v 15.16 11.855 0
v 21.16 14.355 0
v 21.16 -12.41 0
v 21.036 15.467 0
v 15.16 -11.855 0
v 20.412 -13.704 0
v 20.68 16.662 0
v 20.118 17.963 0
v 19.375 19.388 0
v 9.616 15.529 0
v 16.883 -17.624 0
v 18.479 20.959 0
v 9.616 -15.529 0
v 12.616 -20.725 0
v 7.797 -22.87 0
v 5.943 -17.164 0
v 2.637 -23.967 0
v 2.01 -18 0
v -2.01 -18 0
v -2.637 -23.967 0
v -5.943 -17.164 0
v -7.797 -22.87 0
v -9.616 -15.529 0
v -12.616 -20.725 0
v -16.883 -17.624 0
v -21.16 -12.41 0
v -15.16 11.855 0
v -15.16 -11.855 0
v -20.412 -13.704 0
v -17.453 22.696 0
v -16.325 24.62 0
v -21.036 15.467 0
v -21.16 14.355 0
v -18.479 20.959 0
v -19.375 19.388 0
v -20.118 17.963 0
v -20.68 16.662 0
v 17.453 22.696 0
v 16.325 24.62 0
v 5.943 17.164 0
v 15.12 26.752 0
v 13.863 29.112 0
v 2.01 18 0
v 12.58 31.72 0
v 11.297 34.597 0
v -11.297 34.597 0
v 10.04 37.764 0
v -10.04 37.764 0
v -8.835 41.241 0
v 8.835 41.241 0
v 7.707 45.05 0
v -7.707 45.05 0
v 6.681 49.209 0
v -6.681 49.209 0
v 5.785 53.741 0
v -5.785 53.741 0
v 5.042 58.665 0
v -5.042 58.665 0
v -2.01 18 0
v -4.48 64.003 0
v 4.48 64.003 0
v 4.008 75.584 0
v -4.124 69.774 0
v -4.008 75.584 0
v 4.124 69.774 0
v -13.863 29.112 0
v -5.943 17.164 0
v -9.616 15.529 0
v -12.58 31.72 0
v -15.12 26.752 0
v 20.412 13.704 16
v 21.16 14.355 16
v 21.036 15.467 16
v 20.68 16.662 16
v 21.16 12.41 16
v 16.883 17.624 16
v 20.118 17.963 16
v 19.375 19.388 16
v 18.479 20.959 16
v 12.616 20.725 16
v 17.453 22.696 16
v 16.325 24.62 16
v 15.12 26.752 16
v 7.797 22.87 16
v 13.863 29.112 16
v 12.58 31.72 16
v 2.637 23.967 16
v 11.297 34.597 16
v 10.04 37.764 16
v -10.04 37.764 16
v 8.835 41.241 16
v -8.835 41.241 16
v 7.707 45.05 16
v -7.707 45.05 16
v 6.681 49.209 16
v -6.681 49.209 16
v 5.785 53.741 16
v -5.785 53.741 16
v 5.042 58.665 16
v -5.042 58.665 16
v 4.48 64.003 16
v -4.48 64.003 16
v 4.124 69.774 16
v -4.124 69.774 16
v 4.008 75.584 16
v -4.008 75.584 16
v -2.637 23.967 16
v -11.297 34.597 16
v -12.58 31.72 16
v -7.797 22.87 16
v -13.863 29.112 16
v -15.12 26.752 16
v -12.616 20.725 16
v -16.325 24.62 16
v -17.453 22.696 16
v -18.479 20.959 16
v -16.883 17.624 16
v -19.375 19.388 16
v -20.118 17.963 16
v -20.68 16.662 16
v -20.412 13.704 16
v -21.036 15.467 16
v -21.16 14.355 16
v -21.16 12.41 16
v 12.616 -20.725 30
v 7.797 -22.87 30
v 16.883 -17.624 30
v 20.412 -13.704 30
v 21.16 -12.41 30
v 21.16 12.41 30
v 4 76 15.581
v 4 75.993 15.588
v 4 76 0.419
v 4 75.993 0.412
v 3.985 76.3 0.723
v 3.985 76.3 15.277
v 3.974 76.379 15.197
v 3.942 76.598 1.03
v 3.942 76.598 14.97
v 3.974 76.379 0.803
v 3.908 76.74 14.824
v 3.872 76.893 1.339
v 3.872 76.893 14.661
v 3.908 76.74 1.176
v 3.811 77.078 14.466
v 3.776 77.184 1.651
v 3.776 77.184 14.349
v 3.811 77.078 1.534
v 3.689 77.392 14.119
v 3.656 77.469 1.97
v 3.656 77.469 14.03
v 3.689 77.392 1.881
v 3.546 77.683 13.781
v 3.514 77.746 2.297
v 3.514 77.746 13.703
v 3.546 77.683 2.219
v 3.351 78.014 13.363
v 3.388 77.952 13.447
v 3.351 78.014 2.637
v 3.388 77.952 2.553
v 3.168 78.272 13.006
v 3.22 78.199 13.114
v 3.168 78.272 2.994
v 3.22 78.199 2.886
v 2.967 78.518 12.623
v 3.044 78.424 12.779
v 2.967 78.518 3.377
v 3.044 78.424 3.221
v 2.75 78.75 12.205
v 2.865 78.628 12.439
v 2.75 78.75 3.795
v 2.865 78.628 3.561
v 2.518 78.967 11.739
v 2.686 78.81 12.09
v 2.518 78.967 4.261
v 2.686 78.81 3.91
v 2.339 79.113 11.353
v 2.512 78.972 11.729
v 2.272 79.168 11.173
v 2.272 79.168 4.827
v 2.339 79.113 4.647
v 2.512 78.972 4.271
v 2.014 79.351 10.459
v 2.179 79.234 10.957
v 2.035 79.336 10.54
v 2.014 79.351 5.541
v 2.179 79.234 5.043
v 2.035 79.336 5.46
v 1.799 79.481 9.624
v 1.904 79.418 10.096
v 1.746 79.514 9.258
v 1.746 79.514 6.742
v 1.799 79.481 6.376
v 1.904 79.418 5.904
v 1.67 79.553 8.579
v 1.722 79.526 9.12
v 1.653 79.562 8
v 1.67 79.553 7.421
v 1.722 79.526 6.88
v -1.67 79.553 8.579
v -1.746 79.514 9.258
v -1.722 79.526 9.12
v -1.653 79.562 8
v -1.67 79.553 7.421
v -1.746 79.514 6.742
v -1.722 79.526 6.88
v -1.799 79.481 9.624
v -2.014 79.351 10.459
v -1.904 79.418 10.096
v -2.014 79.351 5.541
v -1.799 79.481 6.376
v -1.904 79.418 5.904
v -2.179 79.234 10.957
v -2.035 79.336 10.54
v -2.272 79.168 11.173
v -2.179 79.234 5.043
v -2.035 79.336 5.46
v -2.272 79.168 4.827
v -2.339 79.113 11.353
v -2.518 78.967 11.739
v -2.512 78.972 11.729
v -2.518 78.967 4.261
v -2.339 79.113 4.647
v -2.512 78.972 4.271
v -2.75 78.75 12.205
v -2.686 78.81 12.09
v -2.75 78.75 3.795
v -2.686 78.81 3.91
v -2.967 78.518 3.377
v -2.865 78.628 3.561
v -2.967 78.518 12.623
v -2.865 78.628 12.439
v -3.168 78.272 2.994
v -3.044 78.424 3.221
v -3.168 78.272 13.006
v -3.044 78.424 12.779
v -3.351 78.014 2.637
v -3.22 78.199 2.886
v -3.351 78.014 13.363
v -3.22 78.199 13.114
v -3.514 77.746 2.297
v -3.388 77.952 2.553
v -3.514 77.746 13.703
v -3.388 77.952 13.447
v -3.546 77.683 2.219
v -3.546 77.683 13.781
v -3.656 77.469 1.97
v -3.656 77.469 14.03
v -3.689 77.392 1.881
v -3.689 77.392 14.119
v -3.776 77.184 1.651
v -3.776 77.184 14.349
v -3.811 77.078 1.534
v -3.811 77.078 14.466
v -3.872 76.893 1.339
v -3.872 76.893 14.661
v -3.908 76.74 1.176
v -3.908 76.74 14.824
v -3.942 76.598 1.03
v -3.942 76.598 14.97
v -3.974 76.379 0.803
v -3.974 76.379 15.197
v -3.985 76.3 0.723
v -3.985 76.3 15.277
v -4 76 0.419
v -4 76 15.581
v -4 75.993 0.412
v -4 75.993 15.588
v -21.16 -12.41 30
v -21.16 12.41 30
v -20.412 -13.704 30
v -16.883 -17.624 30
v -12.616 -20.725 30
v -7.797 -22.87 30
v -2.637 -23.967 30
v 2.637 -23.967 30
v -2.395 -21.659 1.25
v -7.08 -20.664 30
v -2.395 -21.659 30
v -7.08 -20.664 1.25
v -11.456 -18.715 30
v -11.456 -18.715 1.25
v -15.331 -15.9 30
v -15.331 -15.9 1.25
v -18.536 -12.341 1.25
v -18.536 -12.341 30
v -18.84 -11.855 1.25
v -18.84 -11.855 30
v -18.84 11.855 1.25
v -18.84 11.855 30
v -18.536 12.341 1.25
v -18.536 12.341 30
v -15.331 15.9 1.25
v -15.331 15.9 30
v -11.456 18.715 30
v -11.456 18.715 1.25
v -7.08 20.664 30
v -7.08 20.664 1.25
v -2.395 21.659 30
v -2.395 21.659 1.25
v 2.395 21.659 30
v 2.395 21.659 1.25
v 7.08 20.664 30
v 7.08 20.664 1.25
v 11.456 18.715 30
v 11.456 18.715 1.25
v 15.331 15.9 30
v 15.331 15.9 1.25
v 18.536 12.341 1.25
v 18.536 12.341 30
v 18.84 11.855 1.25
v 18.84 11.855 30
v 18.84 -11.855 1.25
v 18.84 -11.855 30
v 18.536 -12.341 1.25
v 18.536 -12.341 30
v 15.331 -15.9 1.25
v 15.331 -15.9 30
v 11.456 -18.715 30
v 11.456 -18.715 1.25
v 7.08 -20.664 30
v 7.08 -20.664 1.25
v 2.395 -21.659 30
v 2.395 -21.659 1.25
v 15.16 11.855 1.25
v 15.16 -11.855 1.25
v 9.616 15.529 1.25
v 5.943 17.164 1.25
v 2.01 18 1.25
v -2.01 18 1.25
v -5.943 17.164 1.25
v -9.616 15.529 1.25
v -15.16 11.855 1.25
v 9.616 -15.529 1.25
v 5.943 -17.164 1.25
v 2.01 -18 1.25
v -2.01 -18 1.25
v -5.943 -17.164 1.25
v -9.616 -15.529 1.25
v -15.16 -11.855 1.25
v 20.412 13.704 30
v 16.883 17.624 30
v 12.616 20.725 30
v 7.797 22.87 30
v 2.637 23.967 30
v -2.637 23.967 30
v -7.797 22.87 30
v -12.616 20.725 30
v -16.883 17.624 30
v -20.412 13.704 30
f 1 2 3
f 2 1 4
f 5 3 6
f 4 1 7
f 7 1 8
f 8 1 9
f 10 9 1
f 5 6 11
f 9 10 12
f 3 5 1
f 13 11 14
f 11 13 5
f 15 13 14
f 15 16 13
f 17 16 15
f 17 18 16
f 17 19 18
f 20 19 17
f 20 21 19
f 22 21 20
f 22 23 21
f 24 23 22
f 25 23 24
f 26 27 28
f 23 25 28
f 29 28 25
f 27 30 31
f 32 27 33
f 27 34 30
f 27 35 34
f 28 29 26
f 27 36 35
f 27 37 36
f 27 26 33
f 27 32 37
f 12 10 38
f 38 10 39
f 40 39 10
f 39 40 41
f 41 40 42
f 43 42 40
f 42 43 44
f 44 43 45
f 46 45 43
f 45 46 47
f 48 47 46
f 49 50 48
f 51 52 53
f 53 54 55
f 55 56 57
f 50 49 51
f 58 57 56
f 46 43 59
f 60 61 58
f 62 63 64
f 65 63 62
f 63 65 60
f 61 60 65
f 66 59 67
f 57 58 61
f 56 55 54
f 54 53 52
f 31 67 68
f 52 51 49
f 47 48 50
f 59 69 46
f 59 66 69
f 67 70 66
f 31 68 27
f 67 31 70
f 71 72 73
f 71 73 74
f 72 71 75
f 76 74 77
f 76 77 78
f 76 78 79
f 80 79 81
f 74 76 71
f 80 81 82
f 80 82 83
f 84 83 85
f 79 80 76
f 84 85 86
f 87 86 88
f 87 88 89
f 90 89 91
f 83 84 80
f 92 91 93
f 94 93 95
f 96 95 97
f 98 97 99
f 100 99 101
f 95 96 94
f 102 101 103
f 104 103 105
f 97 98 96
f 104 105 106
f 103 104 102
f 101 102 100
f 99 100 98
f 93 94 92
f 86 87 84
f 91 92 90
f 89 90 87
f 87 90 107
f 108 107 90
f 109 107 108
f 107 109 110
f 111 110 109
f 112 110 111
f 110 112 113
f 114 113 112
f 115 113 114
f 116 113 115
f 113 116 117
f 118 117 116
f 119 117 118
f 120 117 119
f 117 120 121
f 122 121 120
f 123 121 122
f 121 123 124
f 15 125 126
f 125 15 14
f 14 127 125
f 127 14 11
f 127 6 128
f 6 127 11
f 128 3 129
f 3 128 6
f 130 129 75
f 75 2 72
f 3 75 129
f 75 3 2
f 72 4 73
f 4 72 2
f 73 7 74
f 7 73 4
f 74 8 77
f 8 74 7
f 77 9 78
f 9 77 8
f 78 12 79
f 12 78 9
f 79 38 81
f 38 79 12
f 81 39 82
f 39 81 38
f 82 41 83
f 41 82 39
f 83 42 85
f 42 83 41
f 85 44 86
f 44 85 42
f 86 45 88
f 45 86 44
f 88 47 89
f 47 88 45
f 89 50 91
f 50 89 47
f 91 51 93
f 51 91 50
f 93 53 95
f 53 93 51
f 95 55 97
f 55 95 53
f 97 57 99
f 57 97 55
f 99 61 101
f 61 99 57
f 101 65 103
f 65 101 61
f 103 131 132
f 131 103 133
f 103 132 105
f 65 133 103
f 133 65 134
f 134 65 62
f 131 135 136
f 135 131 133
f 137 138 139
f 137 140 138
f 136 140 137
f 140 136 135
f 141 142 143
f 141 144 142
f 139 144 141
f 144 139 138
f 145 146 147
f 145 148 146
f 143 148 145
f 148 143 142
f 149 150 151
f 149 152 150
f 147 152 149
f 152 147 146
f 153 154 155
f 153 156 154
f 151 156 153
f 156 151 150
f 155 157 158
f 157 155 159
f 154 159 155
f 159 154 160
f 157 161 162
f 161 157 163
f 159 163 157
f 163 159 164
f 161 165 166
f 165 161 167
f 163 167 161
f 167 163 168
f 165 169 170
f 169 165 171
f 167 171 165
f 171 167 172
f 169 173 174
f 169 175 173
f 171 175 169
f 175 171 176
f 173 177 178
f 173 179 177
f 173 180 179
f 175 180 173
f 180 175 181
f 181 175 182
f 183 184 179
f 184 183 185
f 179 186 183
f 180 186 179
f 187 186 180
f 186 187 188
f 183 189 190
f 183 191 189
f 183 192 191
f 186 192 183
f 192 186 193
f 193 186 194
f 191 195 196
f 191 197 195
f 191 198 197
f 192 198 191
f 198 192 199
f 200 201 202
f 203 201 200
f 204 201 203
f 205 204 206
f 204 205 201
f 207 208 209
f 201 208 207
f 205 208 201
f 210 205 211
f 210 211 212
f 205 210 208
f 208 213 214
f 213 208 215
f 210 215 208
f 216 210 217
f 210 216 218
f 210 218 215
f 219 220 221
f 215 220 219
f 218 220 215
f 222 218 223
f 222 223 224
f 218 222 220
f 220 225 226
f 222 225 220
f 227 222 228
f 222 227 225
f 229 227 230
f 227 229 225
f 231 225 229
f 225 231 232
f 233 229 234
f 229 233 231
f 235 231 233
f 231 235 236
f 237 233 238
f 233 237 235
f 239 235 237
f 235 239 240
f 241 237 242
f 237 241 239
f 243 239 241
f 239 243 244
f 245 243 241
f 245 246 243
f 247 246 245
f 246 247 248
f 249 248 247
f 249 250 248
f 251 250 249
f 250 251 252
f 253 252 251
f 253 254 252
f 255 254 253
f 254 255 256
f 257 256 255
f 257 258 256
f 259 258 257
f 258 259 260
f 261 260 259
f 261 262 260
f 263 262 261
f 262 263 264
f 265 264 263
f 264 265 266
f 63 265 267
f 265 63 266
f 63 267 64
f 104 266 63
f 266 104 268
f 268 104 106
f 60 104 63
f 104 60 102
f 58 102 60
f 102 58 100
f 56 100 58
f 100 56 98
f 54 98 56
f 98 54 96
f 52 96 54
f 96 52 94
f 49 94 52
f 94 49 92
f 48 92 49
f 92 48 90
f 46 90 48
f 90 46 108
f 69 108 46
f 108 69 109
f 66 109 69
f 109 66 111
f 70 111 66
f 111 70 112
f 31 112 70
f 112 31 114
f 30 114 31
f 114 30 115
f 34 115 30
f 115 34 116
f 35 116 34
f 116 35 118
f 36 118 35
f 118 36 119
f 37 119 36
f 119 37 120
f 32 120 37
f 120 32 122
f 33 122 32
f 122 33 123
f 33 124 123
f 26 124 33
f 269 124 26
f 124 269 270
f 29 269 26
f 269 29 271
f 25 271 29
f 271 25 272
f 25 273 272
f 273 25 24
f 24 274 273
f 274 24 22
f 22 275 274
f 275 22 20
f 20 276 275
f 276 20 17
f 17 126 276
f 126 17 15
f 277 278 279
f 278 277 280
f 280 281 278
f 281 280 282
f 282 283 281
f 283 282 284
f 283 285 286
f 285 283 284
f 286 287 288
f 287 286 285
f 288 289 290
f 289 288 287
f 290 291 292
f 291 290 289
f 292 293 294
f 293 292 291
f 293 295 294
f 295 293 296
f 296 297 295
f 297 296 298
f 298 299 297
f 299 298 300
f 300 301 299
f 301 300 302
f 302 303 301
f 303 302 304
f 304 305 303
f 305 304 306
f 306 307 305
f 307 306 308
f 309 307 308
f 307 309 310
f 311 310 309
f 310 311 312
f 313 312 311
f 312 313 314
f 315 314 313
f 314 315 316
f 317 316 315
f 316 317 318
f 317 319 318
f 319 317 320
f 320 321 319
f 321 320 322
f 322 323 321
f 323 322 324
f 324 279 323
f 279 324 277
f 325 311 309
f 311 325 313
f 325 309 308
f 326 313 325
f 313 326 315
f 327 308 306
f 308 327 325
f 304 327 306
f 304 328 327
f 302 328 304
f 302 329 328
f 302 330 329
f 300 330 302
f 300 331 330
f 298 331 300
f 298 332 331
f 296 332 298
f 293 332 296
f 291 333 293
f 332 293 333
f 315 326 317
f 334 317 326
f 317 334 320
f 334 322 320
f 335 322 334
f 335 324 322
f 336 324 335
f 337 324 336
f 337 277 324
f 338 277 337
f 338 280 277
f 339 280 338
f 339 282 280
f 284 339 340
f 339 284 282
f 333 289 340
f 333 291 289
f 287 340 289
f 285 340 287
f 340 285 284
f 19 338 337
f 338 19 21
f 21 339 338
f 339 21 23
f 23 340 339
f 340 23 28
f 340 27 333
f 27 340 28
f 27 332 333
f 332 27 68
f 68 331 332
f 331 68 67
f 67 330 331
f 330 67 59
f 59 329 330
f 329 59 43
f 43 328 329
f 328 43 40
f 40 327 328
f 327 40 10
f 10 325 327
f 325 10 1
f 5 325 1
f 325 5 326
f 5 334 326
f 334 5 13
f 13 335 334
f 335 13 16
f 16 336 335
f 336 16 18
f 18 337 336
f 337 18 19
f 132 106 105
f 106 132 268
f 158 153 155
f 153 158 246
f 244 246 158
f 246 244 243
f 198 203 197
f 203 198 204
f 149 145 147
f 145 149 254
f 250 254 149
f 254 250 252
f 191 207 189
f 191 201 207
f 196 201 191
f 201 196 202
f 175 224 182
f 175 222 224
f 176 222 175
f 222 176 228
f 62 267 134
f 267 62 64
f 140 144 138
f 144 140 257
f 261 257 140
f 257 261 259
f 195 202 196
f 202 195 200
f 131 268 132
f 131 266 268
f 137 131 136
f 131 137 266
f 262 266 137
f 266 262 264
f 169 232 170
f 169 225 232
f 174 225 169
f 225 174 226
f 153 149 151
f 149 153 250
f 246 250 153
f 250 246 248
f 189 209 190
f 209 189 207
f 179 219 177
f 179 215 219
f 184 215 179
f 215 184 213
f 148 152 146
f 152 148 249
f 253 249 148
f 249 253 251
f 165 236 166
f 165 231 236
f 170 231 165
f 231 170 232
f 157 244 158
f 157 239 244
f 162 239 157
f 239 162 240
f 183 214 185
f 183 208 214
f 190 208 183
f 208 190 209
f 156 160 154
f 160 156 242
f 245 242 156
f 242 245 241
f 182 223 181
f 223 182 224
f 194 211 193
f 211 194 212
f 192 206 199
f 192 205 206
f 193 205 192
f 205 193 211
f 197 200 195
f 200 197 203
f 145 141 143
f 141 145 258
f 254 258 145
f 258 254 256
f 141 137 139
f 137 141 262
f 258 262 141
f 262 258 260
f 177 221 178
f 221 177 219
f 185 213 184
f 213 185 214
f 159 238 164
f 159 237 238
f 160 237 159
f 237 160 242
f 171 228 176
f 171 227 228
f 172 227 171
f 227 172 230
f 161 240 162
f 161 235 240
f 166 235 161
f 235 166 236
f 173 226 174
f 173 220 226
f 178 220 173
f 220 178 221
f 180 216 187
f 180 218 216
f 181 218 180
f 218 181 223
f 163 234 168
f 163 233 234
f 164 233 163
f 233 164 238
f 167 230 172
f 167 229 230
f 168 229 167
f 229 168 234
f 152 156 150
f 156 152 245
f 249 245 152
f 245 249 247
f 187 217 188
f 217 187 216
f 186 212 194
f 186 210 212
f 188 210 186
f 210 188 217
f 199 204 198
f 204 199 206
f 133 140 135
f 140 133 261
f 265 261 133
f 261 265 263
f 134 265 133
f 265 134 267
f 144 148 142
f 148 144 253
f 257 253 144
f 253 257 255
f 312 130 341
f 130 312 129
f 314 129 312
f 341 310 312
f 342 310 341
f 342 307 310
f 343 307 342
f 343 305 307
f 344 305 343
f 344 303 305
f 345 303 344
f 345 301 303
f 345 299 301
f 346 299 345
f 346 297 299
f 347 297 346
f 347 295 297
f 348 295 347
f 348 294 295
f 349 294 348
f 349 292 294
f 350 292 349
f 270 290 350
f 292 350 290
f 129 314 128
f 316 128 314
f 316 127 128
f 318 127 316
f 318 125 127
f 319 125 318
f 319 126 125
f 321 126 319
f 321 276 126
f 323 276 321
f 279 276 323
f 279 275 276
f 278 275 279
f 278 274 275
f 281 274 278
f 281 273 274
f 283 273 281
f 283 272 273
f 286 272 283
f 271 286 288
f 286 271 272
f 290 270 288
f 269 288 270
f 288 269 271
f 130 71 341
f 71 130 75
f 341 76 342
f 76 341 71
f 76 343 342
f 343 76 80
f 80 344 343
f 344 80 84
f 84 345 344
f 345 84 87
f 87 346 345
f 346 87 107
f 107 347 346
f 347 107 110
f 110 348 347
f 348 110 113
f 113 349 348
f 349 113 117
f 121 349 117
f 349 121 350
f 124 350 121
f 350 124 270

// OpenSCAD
fullHeight = 30;
leverHeight = 16;
// longest dimension of faucet, from rounded end to rounded end
length = 43.21;
// distance from flat to flat on faucet
width = 37.32;
// length of flat side
flatLength = 23.71;
// distance from center of rotation to end of lever
leverLength = 80;
tolerance = 0.18;
minimumThickness = 2.5;
leverThickness = 8;
inset = 3.5;
insetHeight = 1.25;

module end_of_parameters_dummy() {}


//BEGIN: use <Bezier.scad>;
/*
Copyright (c) 2017 Alexander R. Pruss.

Licensed under any Creative Commons Attribution license you like or under the
following MIT License.

Permission is hereby granted, free of charge, to any person obtaining a copy
of this software and associated documentation files (the "Software"), to deal
in the Software without restriction, including without limitation the rights
to use, copy, modify, merge, publish, distribute, sublicense, and/or sell
copies of the Software, and to permit persons to whom the Software is
furnished to do so, subject to the following conditions:

The above copyright notice and this permission notice shall be included in all
copies or substantial portions of the Software.

THE SOFTWARE IS PROVIDED "AS IS", WITHOUT WARRANTY OF ANY KIND, EXPRESS OR
IMPLIED, INCLUDING BUT NOT LIMITED TO THE WARRANTIES OF MERCHANTABILITY,
FITNESS FOR A PARTICULAR PURPOSE AND NONINFRINGEMENT. IN NO EVENT SHALL THE
AUTHORS OR COPYRIGHT HOLDERS BE LIABLE FOR ANY CLAIM, DAMAGES OR OTHER
LIABILITY, WHETHER IN AN ACTION OF CONTRACT, TORT OR OTHERWISE, ARISING FROM,
OUT OF OR IN CONNECTION WITH THE SOFTWARE OR THE USE OR OTHER DEALINGS IN THE
SOFTWARE.

*/


// Public domain Bezier stuff from www.thingiverse.com/thing:8443
function BEZ03(u) = pow(1-u, 3);
function BEZ13(u) = 3*u*pow(1-u,2);
function BEZ23(u) = 3*pow(u,2)*(1-u);
function BEZ33(u) = pow(u,3);
function PointAlongBez4(p0, p1, p2, p3, u) =
	BEZ03(u)*p0+BEZ13(u)*p1+BEZ23(u)*p2+BEZ33(u)*p3;
// End public domain Bezier stuff
function d2BEZ03(u) = 6*(1-u);
function d2BEZ13(u) = 18*u-12;
function d2BEZ23(u) = -18*u+6;
function d2BEZ33(u) = 6*u;

function worstCase2ndDerivative(p0, p1, p2, p3, u1, u2)
    = norm([
        for(i=[0:len(p0)-1])
            max([for(u=[u1,u2])
                d2BEZ03(u)*p0[i]+d2BEZ13(u)*p1[i]+
                d2BEZ23(u)*p2[i]+d2BEZ33(u)*p3[i]]) ]);

function neededIntervalLength(p0,p1,p2,p3,u1,u2,tolerance)
    = let(d2=worstCase2ndDerivative(p0,p1,p2,p3,u1,u2))
        d2==0 ? u2-u1+1 : sqrt(2*tolerance/d2);

function REPEAT_MIRRORED(v,angleStart=0,angleEnd=360) = ["m",v,angleStart,angleEnd];
function SMOOTH_REL(x) = ["r",x];
function SMOOTH_ABS(x) = ["a",x];
function SYMMETRIC() = ["r",1];
function OFFSET(v) = ["o",v];
function SHARP() = OFFSET([0,0,0]);
function LINE() = ["l",0];
function POLAR(r,angle) = OFFSET(r*[cos(angle),sin(angle)]);
//function POINT_IS_SPECIAL(v) = (v[0]=="r" || v[0]=="a" || v[0]=="o" || v[0]=="l");

// this does NOT handle offset type points; to handle those, use DecodeBezierOffsets()
function getControlPoint(cp,node,otherCP,otherNode,nextNode) =
    let(v=node-otherCP) (
    cp[0]=="r" ? node+cp[1]*v:
    cp[0]=="a" ? (
        norm(v)<1e-9 ? node+cp[1]*(node-otherNode)/norm(node-otherNode) : node+cp[1]*v/norm(v) ) :
        cp );

function onLine2(a,b,c,eps=1e-4) =
    norm(c-a) <= eps ? true
        : norm(b-a) <= eps ? false /* to be safe */
            : abs((c[1]-a[1])*(b[0]-a[0]) - (b[1]-a[1])*(c[0]-a[0])) <= eps * eps && norm(c-a) <= eps + norm(b-a);

function isStraight2(p1,c1,c2,p2,eps=1e-4) =
    len(p1) == 2 &&
    onLine2(p1,p2,c1,eps=eps) && onLine2(p2,p1,c2,eps=eps);

function Bezier2(p,index=0,precision=0.05,rightEndPoint=true,optimize=true) = let(nPoints=
        max(1, precision < 0 ?
                    ceil(1/
                        neededIntervalLength(p[index],p[index+1],p[index+2],p[index+3],0,1,-precision))
                    : ceil(1/precision)) )
    optimize && isStraight2(p[index],p[index+1],p[index+2],p[index+3]) ? (rightEndPoint?[p[index+0],p[index+3]]:[p[index+0]] ) :
    [for (i=[0:nPoints-(rightEndPoint?0:1)]) PointAlongBez4(p[index+0],p[index+1],p[index+2],p[index+3],i/nPoints)];

function flatten(listOfLists) = [ for(list = listOfLists) for(item = list) item ];


// p is a list of points, in the format:
// [node1,control1,control2,node2,control3, control4,node3, ...]
// You can replace inner control points with:
//   SYMMETRIC: uses a reflection of the control point on the other side of the node
//   SMOOTH_REL(x): like SYMMETRIC, but the distance of the control point to the node is x times the distance of the other control point to the node
//   SMOOTH_ABS(x): like SYMMETRIC, but the distance of the control point to the node is exactly x
// You can also replace any control point with:
//   OFFSET(v): puts the control point at the corresponding node plus the vector v
//   SHARP(): equivalent to OFFSET([0,0])
//   LINE(): when used for both control points between two nodes, generates a straight line
//   POLAR(r,angle): like OFFSET, except the offset is specified in polar coordinates

function DecodeBezierOffset(control,node) = control[0] == "o" ? node+control[1] : control;

function _mirrorMatrix(normalVector) = let(v = normalVector/norm(normalVector)) len(v)<3 ? [[1-2*v[0]*v[0],-2*v[0]*v[1]],[-2*v[0]*v[1],1-2*v[1]*v[1]]] : [[1-2*v[0]*v[0],-2*v[0]*v[1],-2*v[0]*v[2]],[-2*v[0]*v[1],1-2*v[1]*v[1],-2*v[1]*v[2]],[-2*v[0]*v[2],-2*v[1]*v[2],1-2*v[2]*v[2]]];

function _correctLength(p,start=0) =
    start >= len(p) || p[start][0] == "m" ? 3*floor(start/3)+1 : _correctLength(p,start=start+1);

function _trimArray(a, n) = [for (i=[0:n-1]) a[i]];

function _transformPoint(matrix,a) =
    let(n=len(a))
        len(matrix[0])==n+1 ?
            _trimArray(matrix * concat(a,[1]), n)
            : matrix * a;

function _transformPath(matrix,path) =
    [for (a=path) _transformPoint(matrix,a)];

function _reverseArray(array) = let(n=len(array)) [for (i=[0:n-1]) array[n-1-i]];

function _stitchPaths(a,b) = let(na=len(a)) [for (i=[0:na+len(b)-2]) i<na? a[i] : b[i-na+1]-b[0]+a[na-1]];

// replace all OFFSET/SHARP/POLAR points with coordinates
function DecodeBezierOffsets(p) = [for (i=[0:_correctLength(p)-1]) i%3==0?p[i]:(i%3==1?DecodeBezierOffset(p[i],p[i-1]):DecodeBezierOffset(p[i],p[i+1]))];

function _mirrorPaths(basePath, control, start) =
    control[start][0] == "m" ? _mirrorPaths(_stitchPaths(basePath,_reverseArray(_transformPath(_mirrorMatrix( control[start][1] ),basePath))), control, start+1) : basePath;

function DecodeMirrored(path,start=0) =
    start >= len(path) ? path :
    path[start][0] == "m" ? _mirrorPaths([for(i=[0:1:start-1]) path[i]], path, start) :
        DecodeMirrored(path,start=start+1);

function DecodeLines(p) = [for (i=[0:len(p)-1])
    i%3==0 || p[i][0] != "l" ? p[i] :
    i%3 == 1 ? (p[i-1]*2+p[i+2])/3 :
    (p[i-2]+p[i+1]*2)/3 ];

function DecodeSpecialBezierPoints(p0) =
    let(
        l = _correctLength(p0),
        doMirror = len(p0)>l && p0[l][0] == "m",
        p1=DecodeLines(p0),
        p=DecodeBezierOffsets(p1),
        basePath = [for (i=[0:l-1]) i%3==0?p[i]:(i%3==1?getControlPoint(p[i],p[i-1],p[i-2],p[i-4],p[i+2]):getControlPoint(p[i],p[i+1],p[i+2],p[i+4],p[i-2]))])
        doMirror ? _mirrorPaths(basePath, p0, l) : basePath;

function Distance2D(a,b) = sqrt((a[0]-b[0])*(a[0]-b[0])+(a[1]-b[1])*(a[1]-b[1]));

function RemoveDuplicates(p,eps=0.00001) = let(safeEps = eps/len(p)) [for (i=[0:len(p)-1]) if(i==0 || i==len(p)-1 || Distance2D(p[i-1],p[i]) >= safeEps) p[i]];

function Bezier(p,precision=0.05,eps=0.00001,optimize=true) = let(q=DecodeSpecialBezierPoints(p), nodes=(len(q)-1)/3) RemoveDuplicates(flatten([for (i=[0:nodes-1]) Bezier2(q,optimize=optimize,index=i*3,precision=precision,rightEndPoint=(i==nodes-1))]),eps=eps);

function GetSplineAngle(a,b,c) =
    a==c && b==a ? 0 :
    a==c ? let(ba=b-a) atan2(ba[1],ba[0]) :
    let(ca=c-a) atan2(ca[1],ca[0]);

/*    let(ba=norm(b-a),cb=norm(c-b))
        ba == 0 && cb == 0 ? 0 :
    let(v = ba == 0 ? c-b :
            cb == 0 ? b-a :
            (c-b)*norm(b-a)/norm(c-b)+(b-a))
    atan2(v[1],v[0]); */

// do a spline around b
function SplineAroundPoint(a,b,c,tension=0.5,includeLeftCP=true,includeRightCP=true) =
    includeLeftCP && includeRightCP ?
        [POLAR(tension*norm(a-b),GetSplineAngle(c,b,a)),b,POLAR(tension*norm(c-b),GetSplineAngle(a,b,c))] :
    includeLeftCP ?
        [POLAR(tension*norm(a-b),GetSplineAngle(c,b,a)),b] :
    includeRightCP ?
        [b,POLAR(tension*norm(c-b),GetSplineAngle(a,b,c))] :
        [b];

function mod(n,m) = let(q=n%m) q>=0 ? q : m+q;

function _unit(v) = norm(v)==0 ? [for(x=v) 0] : v/norm(v);

function _corner(p0,p1,p2,offset=2,tension=0.448084975506) =
    [p1-_unit(p1-p0)*offset,
    p1-_unit(p1-p0)*offset*(1-tension),
    p1-_unit(p1-p2)*offset*(1-tension),
    p1-_unit(p1-p2)*offset,
    LINE(),LINE()];

function _roundPathRaw(path,start,end,offset=2,tension=0.551915024494) =
    let(n=len(path),
        p2=_mirrorPaths(path))
        [for(p=[for(i=[start:1:end-1]) _corner(p2[mod(i-1,n)],p2[i],path[mod(i+1,n)],offset=offset,tension=tension)]) for(q=p) q];

function PathToBezier(path,offset=2,tension=0.551915024494,closed=false) =
    let(p1=DecodeMirrored(path),
        n=len(p1))
        offset==0 && tension==0 ?
        p1 :
        !closed ? concat([p1[0],LINE(),LINE()], _roundPathRaw(p1,1,n-1,offset=offset,tension=tension), [p1[n-1]]) :
        let(p2 = _roundPathRaw(p1,0,n,offset=offset,tension=tension),
            n2 = len(p2))
        [for(i=[0:1:n2-3]) p2[mod(i,n2)]];
function BezierSmoothPoints(points,tension=0.5,closed=false)
    = let (n=len(points))
        flatten(
        closed ? [ for (i=[0:n]) SplineAroundPoint(points[(n+i-1)%n],points[i%n],points[(i+1)%n],tension=tension,includeLeftCP=i>0,includeRightCP=i<n) ] :
        [ for (i=[0:n-1])
            SplineAroundPoint(
            i==0 ? 2*points[0]-points[1] : points[(n+i-1)%n],
            points[i],
            i==n-1 ? 2*points[n-1]-points[n-2] : points[(i+1)%n],tension=tension,includeLeftCP=i>0,includeRightCP=i<n-1  ) ]);

module BezierVisualize(p,precision=0.05,eps=0.00001,lineThickness=0.25,controlLineThickness=0.125,nodeSize=1) {
    $fn = 16;
    dim = len(p[0]);
    module point(size) {
        if (dim==2)
            circle(d=size);
        else
            sphere(d=size);
    }
    p1 = DecodeSpecialBezierPoints(p);
    l = Bezier(p1,precision=precision,eps=eps);
    for (i=[0:len(l)-2]) {
        hull() {
            translate(l[i]) point(lineThickness);
            translate(l[i+1]) point(lineThickness);
        }
    }
    for (i=[0:len(p1)-1]) {
        if (i%3 == 0) {
            color("black") translate(p1[i]) point(nodeSize);
        }
        else {
            node = i%3 == 1 ? i-1 : i+1;
            color("red") translate(p1[i]) point(nodeSize);
            color("red") hull() {
                translate(p1[node]) point(controlLineThickness);
                translate(p1[i]) point(controlLineThickness);
            }
        }
    }
}


//END: use <Bezier.scad>;



H = (length-flatLength)/2;
W = width;
R = H/2+W*W/(8*H);
center = H-R;
echo(R);
echo(norm([W/2,H-R]));

module profile() {
    polygon(Bezier([[0,0],LINE(),LINE(),[leverLength-leverHeight/4,0],POLAR(leverHeight/4,45),POLAR(leverHeight/4,-90),[leverLength,leverHeight/2],REPEAT_MIRRORED([0,1])]));
}

module baseShape(delta=0) {
    hull() {
        radius = R+delta;
        top = length/2+delta-radius;
        intersection() {
            union() {
                translate([0,top])
                intersection() {
                    circle(r=radius);
                    translate([0,radius]) square(2*radius,center=true);
                }
                translate([0,-top])             intersection() {
                    circle(r=radius);
                    translate([0,-radius]) square(2*radius,center=true);
                }
            square([W+2*delta,flatLength],center=true);
            }
            square([W+2*delta,flatLength+4*radius],center=true);
        }
    }
}

x = width/2+minimumThickness;
y = flatLength/2+minimumThickness;
x0 = leverThickness/2;
y1 = leverLength;
edge = Bezier([[x,0],POLAR(length/4,90),POLAR(y/2,-90),[x,y],SMOOTH_ABS(y/2),POLAR(3*y,-90), [x0,y1-x0],SMOOTH_ABS(x0/2),POLAR(x0/2,0),[0,y1],REPEAT_MIRRORED([1,0])]);

module section() {
    difference() {
        union() {
            polygon(edge);
            baseShape(delta=minimumThickness);
        }
        baseShape(delta=tolerance);
    }
}


module main() {
    intersection() {
        union() {
            linear_extrude(height=leverHeight) section();
            linear_extrude(height=insetHeight)
                difference() {
                    baseShape(delta=tolerance*1.5);
                    baseShape(delta=-inset);
                }
            }
        rotate_extrude() profile();
        }

    linear_extrude(height=fullHeight) difference() {
        baseShape(delta=minimumThickness);
        baseShape(delta=tolerance);
    }
}

main();
